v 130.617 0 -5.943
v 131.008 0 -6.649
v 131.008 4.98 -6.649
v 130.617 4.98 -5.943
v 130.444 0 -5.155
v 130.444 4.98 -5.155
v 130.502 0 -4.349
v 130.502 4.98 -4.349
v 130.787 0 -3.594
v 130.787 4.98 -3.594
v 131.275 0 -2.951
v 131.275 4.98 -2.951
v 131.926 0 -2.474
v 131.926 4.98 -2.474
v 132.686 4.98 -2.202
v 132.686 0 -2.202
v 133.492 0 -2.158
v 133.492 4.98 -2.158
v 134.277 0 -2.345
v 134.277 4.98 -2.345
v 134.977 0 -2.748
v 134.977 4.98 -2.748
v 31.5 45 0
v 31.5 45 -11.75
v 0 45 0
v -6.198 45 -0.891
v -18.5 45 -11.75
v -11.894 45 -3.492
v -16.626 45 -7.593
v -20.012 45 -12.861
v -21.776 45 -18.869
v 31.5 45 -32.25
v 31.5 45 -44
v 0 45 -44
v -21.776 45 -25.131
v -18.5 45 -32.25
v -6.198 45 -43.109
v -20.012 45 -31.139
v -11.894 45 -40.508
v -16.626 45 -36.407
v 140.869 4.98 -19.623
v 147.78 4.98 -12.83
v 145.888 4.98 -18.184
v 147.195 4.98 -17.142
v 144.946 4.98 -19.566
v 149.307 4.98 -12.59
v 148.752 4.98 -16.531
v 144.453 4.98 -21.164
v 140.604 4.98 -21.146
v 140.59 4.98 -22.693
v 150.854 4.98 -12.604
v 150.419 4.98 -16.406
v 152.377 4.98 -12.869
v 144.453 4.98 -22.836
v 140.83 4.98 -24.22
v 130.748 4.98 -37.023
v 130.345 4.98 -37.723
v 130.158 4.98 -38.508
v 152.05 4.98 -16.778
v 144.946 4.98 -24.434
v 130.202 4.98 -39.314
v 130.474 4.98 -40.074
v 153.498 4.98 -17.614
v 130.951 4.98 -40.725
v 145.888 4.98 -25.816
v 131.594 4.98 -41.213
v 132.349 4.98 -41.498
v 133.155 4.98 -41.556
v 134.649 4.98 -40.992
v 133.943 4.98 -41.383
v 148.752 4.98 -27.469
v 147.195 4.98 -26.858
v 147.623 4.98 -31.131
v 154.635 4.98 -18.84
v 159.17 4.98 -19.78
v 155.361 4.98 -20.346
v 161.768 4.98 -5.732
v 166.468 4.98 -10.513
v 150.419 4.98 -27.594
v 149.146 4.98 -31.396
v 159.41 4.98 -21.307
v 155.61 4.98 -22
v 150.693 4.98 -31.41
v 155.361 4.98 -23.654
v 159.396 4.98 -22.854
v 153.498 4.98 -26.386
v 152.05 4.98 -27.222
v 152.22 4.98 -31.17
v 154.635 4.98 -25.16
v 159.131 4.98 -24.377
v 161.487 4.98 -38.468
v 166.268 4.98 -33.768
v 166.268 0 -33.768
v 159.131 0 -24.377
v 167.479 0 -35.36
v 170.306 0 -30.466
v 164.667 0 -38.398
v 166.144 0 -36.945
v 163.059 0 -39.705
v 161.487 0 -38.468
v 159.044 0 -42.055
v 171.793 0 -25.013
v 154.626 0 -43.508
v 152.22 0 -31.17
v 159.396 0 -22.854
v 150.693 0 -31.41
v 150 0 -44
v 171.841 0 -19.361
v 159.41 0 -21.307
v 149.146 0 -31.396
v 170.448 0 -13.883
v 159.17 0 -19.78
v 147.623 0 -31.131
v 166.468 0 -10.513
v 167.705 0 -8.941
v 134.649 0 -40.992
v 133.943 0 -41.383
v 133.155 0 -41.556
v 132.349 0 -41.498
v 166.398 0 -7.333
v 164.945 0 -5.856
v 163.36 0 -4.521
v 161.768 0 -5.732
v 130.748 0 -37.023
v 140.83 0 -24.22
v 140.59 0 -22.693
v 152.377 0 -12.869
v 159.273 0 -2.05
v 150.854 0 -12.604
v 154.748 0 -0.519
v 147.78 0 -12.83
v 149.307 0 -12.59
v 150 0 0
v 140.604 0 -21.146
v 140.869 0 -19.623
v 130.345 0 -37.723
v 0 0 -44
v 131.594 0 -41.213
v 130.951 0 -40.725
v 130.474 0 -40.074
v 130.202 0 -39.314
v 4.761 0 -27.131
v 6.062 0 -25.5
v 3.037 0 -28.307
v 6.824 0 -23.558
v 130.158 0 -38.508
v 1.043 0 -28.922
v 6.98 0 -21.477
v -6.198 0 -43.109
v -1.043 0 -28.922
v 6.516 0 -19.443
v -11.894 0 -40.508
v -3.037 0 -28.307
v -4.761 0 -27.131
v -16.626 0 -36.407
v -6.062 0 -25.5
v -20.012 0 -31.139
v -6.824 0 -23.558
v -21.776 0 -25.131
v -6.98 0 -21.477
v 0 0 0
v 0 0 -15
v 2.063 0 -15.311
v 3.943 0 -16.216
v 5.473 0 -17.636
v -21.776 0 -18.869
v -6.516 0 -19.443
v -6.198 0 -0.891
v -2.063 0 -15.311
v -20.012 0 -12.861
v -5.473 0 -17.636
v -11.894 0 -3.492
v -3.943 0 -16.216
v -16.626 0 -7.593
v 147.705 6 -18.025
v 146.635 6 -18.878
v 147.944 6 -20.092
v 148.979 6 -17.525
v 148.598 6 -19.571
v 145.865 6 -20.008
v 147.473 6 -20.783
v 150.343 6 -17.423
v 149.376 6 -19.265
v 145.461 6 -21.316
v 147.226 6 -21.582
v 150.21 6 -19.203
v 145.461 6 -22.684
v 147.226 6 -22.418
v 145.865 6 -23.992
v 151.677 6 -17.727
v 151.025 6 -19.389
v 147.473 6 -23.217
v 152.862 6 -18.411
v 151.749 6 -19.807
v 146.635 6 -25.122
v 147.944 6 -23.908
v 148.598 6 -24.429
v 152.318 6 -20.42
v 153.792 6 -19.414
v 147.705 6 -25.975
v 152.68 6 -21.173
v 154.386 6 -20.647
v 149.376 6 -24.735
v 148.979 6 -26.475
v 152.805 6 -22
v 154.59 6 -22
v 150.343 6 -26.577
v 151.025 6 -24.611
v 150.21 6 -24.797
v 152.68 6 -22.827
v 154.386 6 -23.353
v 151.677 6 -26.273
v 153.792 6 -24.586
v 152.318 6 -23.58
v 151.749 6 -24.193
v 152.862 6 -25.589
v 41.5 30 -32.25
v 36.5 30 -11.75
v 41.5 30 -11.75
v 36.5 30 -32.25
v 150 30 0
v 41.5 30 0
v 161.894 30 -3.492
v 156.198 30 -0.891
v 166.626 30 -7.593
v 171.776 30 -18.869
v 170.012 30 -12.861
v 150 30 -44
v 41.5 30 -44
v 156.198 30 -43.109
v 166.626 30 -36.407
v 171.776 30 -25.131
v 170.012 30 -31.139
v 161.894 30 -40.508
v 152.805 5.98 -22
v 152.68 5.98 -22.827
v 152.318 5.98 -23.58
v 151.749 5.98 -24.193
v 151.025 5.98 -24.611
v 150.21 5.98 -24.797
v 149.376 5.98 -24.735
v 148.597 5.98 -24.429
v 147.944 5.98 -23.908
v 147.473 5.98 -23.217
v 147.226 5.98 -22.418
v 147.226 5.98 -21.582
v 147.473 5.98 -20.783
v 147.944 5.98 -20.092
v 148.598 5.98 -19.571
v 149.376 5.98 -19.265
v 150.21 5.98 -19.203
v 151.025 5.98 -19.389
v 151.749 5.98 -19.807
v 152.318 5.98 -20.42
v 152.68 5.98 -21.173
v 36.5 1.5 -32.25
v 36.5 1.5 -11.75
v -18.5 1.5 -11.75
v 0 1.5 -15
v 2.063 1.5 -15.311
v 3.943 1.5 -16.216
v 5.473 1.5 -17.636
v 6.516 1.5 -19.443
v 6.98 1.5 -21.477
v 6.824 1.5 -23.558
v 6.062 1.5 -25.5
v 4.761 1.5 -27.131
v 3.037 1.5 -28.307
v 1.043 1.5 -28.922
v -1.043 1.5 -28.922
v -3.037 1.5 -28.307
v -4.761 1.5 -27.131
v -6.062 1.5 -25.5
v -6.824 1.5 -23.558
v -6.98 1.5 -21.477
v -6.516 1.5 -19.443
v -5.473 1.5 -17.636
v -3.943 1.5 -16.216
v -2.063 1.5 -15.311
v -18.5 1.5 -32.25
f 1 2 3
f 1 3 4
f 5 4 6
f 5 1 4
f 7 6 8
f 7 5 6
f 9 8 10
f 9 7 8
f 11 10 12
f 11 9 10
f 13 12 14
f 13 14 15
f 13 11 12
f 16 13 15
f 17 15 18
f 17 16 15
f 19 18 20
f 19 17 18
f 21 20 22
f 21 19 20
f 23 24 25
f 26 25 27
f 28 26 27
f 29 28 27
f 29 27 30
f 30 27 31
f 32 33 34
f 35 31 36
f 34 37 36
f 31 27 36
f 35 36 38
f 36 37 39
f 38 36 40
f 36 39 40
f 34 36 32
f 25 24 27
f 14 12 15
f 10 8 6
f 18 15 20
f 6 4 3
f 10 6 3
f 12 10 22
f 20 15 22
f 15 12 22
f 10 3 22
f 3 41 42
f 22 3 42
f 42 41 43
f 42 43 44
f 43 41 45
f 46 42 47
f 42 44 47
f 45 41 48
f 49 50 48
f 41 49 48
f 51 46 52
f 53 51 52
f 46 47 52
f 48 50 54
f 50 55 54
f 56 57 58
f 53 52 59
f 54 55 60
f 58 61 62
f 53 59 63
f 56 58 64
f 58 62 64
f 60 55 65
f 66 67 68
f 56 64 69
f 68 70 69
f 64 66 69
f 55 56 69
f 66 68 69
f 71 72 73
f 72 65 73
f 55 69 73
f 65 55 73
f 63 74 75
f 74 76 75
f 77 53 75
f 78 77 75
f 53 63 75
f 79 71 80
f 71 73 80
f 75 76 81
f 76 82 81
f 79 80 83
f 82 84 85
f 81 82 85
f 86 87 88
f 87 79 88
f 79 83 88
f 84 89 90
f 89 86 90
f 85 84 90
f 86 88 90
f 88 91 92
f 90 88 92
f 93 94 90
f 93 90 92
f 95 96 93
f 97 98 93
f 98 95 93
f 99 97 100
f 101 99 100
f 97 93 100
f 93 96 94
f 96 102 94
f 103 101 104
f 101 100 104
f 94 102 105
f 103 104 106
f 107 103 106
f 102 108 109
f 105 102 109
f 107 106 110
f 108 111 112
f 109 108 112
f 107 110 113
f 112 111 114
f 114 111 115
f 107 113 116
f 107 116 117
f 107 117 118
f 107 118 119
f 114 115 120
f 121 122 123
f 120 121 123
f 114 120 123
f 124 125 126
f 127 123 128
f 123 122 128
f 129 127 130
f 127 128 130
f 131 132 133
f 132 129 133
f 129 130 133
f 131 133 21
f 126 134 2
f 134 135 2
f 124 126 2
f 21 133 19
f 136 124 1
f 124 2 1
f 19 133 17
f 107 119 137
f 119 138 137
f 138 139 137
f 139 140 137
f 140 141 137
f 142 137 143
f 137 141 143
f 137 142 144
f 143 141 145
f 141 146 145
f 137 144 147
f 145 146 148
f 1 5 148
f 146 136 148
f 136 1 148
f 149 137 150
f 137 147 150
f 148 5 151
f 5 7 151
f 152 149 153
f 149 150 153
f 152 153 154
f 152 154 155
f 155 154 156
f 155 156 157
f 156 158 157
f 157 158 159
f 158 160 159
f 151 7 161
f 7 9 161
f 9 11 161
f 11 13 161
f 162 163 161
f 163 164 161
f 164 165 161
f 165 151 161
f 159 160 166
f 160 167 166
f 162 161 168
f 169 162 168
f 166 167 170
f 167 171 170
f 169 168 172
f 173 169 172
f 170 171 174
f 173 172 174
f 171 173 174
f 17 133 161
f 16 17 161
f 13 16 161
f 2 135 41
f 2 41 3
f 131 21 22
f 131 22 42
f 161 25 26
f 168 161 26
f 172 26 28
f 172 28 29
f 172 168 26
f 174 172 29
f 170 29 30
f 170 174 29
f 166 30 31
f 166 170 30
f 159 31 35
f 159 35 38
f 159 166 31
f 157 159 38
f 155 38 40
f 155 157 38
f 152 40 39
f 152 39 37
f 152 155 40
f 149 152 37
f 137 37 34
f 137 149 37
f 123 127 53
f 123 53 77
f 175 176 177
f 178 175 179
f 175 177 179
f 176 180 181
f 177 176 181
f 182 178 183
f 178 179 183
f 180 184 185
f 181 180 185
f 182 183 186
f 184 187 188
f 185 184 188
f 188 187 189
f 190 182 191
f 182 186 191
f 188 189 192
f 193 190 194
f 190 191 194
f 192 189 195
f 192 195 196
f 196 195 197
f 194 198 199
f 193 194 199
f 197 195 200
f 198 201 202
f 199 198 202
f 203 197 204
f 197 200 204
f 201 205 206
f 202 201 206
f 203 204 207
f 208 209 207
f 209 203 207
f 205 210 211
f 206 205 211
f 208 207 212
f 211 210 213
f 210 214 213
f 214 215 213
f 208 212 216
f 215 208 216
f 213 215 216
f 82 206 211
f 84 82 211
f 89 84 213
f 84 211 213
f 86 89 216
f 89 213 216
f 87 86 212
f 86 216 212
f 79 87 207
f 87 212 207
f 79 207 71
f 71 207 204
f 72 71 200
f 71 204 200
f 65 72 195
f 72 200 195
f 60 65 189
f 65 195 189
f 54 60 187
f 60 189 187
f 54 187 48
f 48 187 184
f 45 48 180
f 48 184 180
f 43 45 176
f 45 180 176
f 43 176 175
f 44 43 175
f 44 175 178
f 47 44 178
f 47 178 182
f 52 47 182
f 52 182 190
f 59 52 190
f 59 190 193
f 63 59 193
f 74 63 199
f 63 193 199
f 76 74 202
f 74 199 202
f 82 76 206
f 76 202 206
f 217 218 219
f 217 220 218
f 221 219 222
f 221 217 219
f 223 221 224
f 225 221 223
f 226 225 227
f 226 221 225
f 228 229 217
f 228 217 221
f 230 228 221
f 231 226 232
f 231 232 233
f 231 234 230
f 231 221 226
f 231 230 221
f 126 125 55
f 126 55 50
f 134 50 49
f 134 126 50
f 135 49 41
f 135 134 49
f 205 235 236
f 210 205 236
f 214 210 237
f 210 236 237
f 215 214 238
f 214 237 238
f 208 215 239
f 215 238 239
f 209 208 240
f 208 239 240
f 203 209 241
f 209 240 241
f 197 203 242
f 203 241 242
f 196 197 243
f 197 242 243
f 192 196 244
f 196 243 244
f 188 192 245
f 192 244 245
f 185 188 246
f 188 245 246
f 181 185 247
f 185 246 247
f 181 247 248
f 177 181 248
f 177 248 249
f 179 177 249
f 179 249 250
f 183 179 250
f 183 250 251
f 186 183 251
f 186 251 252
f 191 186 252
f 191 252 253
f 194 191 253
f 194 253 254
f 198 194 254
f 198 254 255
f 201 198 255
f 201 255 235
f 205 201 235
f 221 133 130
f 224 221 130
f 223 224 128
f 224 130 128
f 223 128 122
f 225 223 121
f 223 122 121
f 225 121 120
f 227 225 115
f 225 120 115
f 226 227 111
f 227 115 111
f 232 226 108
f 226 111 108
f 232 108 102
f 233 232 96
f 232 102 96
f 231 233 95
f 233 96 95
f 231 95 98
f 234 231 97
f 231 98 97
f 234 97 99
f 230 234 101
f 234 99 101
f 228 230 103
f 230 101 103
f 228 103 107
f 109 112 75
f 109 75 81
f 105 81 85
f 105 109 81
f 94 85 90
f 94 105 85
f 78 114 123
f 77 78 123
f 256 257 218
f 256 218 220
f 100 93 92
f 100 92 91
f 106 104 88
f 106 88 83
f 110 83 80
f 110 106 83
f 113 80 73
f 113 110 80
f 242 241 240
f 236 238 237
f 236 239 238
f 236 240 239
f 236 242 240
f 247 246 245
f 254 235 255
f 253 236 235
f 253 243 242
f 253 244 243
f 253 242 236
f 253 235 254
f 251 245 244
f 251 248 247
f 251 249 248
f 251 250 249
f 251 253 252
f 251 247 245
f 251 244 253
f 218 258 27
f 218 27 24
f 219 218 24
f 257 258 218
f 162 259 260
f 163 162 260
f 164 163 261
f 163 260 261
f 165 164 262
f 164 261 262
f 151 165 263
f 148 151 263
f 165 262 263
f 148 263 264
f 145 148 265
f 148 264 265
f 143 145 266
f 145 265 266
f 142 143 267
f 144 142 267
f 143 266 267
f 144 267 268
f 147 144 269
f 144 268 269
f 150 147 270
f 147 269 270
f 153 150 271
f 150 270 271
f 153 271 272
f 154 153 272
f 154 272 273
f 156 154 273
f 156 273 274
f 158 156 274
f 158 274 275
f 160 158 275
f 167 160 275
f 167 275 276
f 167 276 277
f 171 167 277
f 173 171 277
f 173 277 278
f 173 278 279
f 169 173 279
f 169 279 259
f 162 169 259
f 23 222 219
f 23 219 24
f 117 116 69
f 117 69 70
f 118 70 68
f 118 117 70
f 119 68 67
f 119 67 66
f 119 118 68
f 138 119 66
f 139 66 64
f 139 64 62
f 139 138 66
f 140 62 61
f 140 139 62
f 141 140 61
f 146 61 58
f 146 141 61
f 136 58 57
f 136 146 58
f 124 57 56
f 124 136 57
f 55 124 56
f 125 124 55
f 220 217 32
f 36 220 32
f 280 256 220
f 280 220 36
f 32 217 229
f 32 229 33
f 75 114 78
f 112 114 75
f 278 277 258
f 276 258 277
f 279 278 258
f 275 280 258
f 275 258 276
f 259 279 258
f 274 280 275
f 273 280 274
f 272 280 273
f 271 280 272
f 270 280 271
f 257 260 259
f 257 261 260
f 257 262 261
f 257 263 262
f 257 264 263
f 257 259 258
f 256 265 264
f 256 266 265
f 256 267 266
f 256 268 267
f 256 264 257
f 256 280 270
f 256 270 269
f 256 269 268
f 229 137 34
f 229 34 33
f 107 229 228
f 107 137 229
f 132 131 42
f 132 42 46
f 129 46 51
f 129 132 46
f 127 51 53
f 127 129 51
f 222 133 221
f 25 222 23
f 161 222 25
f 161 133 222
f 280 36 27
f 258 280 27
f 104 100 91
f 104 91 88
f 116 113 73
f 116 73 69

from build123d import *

# Parameters (mm, degrees)
BOSS_EXTRUDE1_DEPTH = 30
SKETCH2_R           = 7
CUT_EXTRUDE1_DEPTH  = 181.055546985
CUT_EXTRUDE2_DEPTH  = 28.5
BOSS_EXTRUDE2_DEPTH = 15
CUT_EXTRUDE3_DEPTH  = 184.152941554
CAVITY1_OUTLINE_R   = 1.02
CAVITY1_DEPTH       = 4.98
CAVITY1_START       = 2.94
CAVITY1_2_OUTLINE_R = 1.683
CAVITY1_2_DEPTH     = 2.04
CAVITY1_START_2     = 4.98
CAVITY1_3_OUTLINE_R = 2.805
CAVITY1_3_DEPTH     = 1.02
SKETCH7_R           = 1.02
SKETCH7_R_2         = 5.61
CUT_EXTRUDE4_DEPTH  = 4.98
SKETCH8_R           = 2.805
CUT_EXTRUDE5_DEPTH  = 1
BOSS_EXTRUDE3_START = 4.98
BOSS_EXTRUDE3_DEPTH = 4.98


with BuildPart() as part:
    # Sketch1 → Boss-Extrude1 (new body)
    with BuildSketch(Plane(origin=(0, 0, 0), x_dir=(1, 0, 0), z_dir=(0, 1, 0))):
        with BuildLine():
            Line((0, 0), (150, 0))
            ThreePointArc((150, 0), (172, 22), (150, 44))
            Line((150, 44), (0, 44))
            ThreePointArc((0, 44), (-22, 22), (0, 0))
        make_face()
    extrude(amount=BOSS_EXTRUDE1_DEPTH)

    # Sketch2 → Cut-Extrude1 (cut, through all)
    with BuildSketch(Plane(origin=(0, 30, 0), x_dir=(1, 0, 0), z_dir=(0, 1, 0))):
        with Locations(Location((0, 22, 0), (0, 0, 270))):
            Circle(SKETCH2_R)
    extrude(amount=-CUT_EXTRUDE1_DEPTH, mode=Mode.SUBTRACT)

    # Sketch3 → Cut-Extrude2 (cut)
    with BuildSketch(Plane(origin=(0, 30, 0), x_dir=(1, 0, 0), z_dir=(0, 1, 0))):
        Polygon((0, 32.25), (-18.5, 32.25), (-18.5, 11.75), (0, 11.75), (36.5, 11.75), (36.5, 32.25), align=None)
    extrude(amount=-CUT_EXTRUDE2_DEPTH, mode=Mode.SUBTRACT)

    # Sketch5 → Boss-Extrude2 (add)
    with BuildSketch(Plane(origin=(0, 30, 0), x_dir=(1, 0, 0), z_dir=(0, 1, 0))):
        with BuildLine():
            Line((-18.5, 32.25), (-18.5, 11.75))
            Line((-18.5, 11.75), (41.5, 11.75))
            Line((41.5, 11.75), (41.5, 0))
            Line((41.5, 0), (0, 0))
            ThreePointArc((0, 0), (-22, 22), (0, 44))
            Line((0, 44), (41.5, 44))
            Line((41.5, 44), (41.5, 32.25))
            Line((41.5, 32.25), (-18.5, 32.25))
        make_face()
    extrude(amount=BOSS_EXTRUDE2_DEPTH)

    # Sketch6 → Cut-Extrude3 (cut, through all)
    with BuildSketch(Plane.XY):
        Polygon((31.5, 45), (41.5, 45), (41.5, 30), align=None)
    extrude(amount=-CUT_EXTRUDE3_DEPTH, mode=Mode.SUBTRACT)

    # Cavity1: read off the stored shape, not the designer's step
    # Cavity1 outline → Cavity1 (cut)
    with BuildSketch(Plane(origin=(0, 0, 0), x_dir=(1, 0, 0), z_dir=(0, 1, 0))):
        with BuildLine():
            ThreePointArc((147.779668933, 12.829975193), (150.080823725, 12.565346189), (152.377107132, 12.869360007))
            Line((152.377107132, 12.869360007), (163.360195023, 4.52129327))
            ThreePointArc((163.360195023, 4.52129327), (165.689039875, 6.577483091), (167.705029876, 8.941213032))
            Line((167.705029876, 8.941213032), (159.170024807, 19.779668933))
            ThreePointArc((159.170024807, 19.779668933), (159.434653811, 22.080823725), (159.130639993, 24.377107132))
            Line((159.130639993, 24.377107132), (167.47870673, 35.360195023))
            ThreePointArc((167.47870673, 35.360195023), (165.422516909, 37.689039875), (163.058786968, 39.705029876))
            Line((163.058786968, 39.705029876), (152.220331067, 31.170024807))
            ThreePointArc((152.220331067, 31.170024807), (149.919176275, 31.434653811), (147.622892868, 31.130639993))
            Line((147.622892868, 31.130639993), (134.649096594, 40.991811842))
            ThreePointArc((134.649096594, 40.991811842), (130.951366883, 40.725037906), (130.747982035, 37.023280491))
            Line((130.747982035, 37.023280491), (140.829975193, 24.220331067))
            ThreePointArc((140.829975193, 24.220331067), (140.565346189, 21.919176275), (140.869360007, 19.622892868))
            Line((140.869360007, 19.622892868), (131.008188158, 6.649096594))
            ThreePointArc((131.008188158, 6.649096594), (131.274962094, 2.951366883), (134.976719509, 2.747982035))
            Line((134.976719509, 2.747982035), (147.779668933, 12.829975193))
        make_face()
        with Locations((133.375227796, 5.087928153)):
            Circle(CAVITY1_OUTLINE_R, mode=Mode.SUBTRACT)
        with Locations((136.950447624, 8.724932851)):
            Circle(CAVITY1_OUTLINE_R, mode=Mode.SUBTRACT)
        with Locations((140.525667453, 12.36193755)):
            Circle(CAVITY1_OUTLINE_R, mode=Mode.SUBTRACT)
        with Locations((144.100887282, 15.998942248)):
            Circle(CAVITY1_OUTLINE_R, mode=Mode.SUBTRACT)
        with Locations((163.275067149, 8.950447624)):
            Circle(CAVITY1_OUTLINE_R, mode=Mode.SUBTRACT)
        with Locations((156.001057752, 16.100887282)):
            Circle(CAVITY1_OUTLINE_R, mode=Mode.SUBTRACT)
        with Locations((159.63806245, 12.525667453)):
            Circle(CAVITY1_OUTLINE_R, mode=Mode.SUBTRACT)
        with Locations((140.36193755, 31.474332547)):
            Circle(CAVITY1_OUTLINE_R, mode=Mode.SUBTRACT)
        with BuildLine():
            Line((152.373607277, 19.467574131), (152.689172923, 18.931653704))
            ThreePointArc((152.689172923, 18.931653704), (152.511383831, 18.784513838), (152.325559725, 18.647661717))
            Line((152.325559725, 18.647661717), (151.882040304, 19.083646698))
            Line((151.882040304, 19.083646698), (151.637288525, 18.939529681))
            Line((151.637288525, 18.939529681), (151.80339512, 18.340195901))
            ThreePointArc((151.80339512, 18.340195901), (151.593581444, 18.244084908), (151.378669205, 18.159990726))
            Line((151.378669205, 18.159990726), (151.063103559, 18.695911153))
            Line((151.063103559, 18.695911153), (150.789391266, 18.620051226))
            Line((150.789391266, 18.620051226), (150.794718919, 17.998147699))
            ThreePointArc((150.794718919, 17.998147699), (150.567179115, 17.959615383), (150.337824658, 17.934010022))
            Line((150.337824658, 17.934010022), (150.171718063, 18.533343802))
            Line((150.171718063, 18.533343802), (149.887698297, 18.530910694))
            Line((149.887698297, 18.530910694), (149.731883937, 17.928819118))
            ThreePointArc((149.731883937, 17.928819118), (149.502124467, 17.950491394), (149.273957918, 17.985119816))
            Line((149.273957918, 17.985119816), (149.268630266, 18.607023342))
            Line((149.268630266, 18.607023342), (148.993658503, 18.678182865))
            Line((148.993658503, 18.678182865), (148.687320622, 18.136934786))
            ThreePointArc((148.687320622, 18.136934786), (148.470999214, 18.217334723), (148.259569747, 18.309837059))
            Line((148.259569747, 18.309837059), (148.415384106, 18.911928635))
            Line((148.415384106, 18.911928635), (148.168199219, 19.051831385))
            Line((148.168199219, 19.051831385), (147.732214237, 18.608311964))
            ThreePointArc((147.732214237, 18.608311964), (147.544072837, 18.74196044), (147.363789021, 18.886032808))
            Line((147.363789021, 18.886032808), (147.670126902, 19.427280887))
            Line((147.670126902, 19.427280887), (147.467574131, 19.626392723))
            Line((147.467574131, 19.626392723), (146.931653704, 19.310827077))
            ThreePointArc((146.931653704, 19.310827077), (146.784513838, 19.488616169), (146.647661717, 19.674440275))
            Line((146.647661717, 19.674440275), (147.083646698, 20.117959696))
            Line((147.083646698, 20.117959696), (146.939529681, 20.362711475))
            Line((146.939529681, 20.362711475), (146.340195901, 20.19660488))
            ThreePointArc((146.340195901, 20.19660488), (146.244084908, 20.406418556), (146.159990726, 20.621330795))
            Line((146.159990726, 20.621330795), (146.695911153, 20.936896441))
            Line((146.695911153, 20.936896441), (146.620051226, 21.210608734))
            Line((146.620051226, 21.210608734), (145.998147699, 21.205281081))
            ThreePointArc((145.998147699, 21.205281081), (145.959615383, 21.432820885), (145.934010022, 21.662175342))
            Line((145.934010022, 21.662175342), (146.533343802, 21.828281937))
            Line((146.533343802, 21.828281937), (146.530910694, 22.112301703))
            Line((146.530910694, 22.112301703), (145.928819118, 22.268116063))
            ThreePointArc((145.928819118, 22.268116063), (145.950491394, 22.497875533), (145.985119816, 22.726042082))
            Line((145.985119816, 22.726042082), (146.607023342, 22.731369734))
            Line((146.607023342, 22.731369734), (146.678182865, 23.006341497))
            Line((146.678182865, 23.006341497), (146.136934786, 23.312679378))
            ThreePointArc((146.136934786, 23.312679378), (146.217334723, 23.529000786), (146.309837059, 23.740430253))
            Line((146.309837059, 23.740430253), (146.911928635, 23.584615894))
            Line((146.911928635, 23.584615894), (147.051831385, 23.831800781))
            Line((147.051831385, 23.831800781), (146.608311964, 24.267785763))
            ThreePointArc((146.608311964, 24.267785763), (146.74196044, 24.455927163), (146.886032808, 24.636210979))
            Line((146.886032808, 24.636210979), (147.427280887, 24.329873098))
            Line((147.427280887, 24.329873098), (147.626392723, 24.532425869))
            Line((147.626392723, 24.532425869), (147.310827077, 25.068346296))
            ThreePointArc((147.310827077, 25.068346296), (147.488616169, 25.215486162), (147.674440275, 25.352338283))
            Line((147.674440275, 25.352338283), (148.117959696, 24.916353302))
            Line((148.117959696, 24.916353302), (148.362711475, 25.060470319))
            Line((148.362711475, 25.060470319), (148.19660488, 25.659804099))
            ThreePointArc((148.19660488, 25.659804099), (148.406418556, 25.755915092), (148.621330795, 25.840009274))
            Line((148.621330795, 25.840009274), (148.936896441, 25.304088847))
            Line((148.936896441, 25.304088847), (149.210608734, 25.379948774))
            Line((149.210608734, 25.379948774), (149.205281081, 26.001852301))
            ThreePointArc((149.205281081, 26.001852301), (149.432820885, 26.040384617), (149.662175342, 26.065989978))
            Line((149.662175342, 26.065989978), (149.828281937, 25.466656198))
            Line((149.828281937, 25.466656198), (150.112301703, 25.469089306))
            Line((150.112301703, 25.469089306), (150.268116063, 26.071180882))
            ThreePointArc((150.268116063, 26.071180882), (150.497875533, 26.049508606), (150.726042082, 26.014880184))
            Line((150.726042082, 26.014880184), (150.731369734, 25.392976658))
            Line((150.731369734, 25.392976658), (151.006341497, 25.321817135))
            Line((151.006341497, 25.321817135), (151.312679378, 25.863065214))
            ThreePointArc((151.312679378, 25.863065214), (151.529000786, 25.782665277), (151.740430253, 25.690162941))
            Line((151.740430253, 25.690162941), (151.584615894, 25.088071365))
            Line((151.584615894, 25.088071365), (151.831800781, 24.948168615))
            Line((151.831800781, 24.948168615), (152.267785763, 25.391688036))
            ThreePointArc((152.267785763, 25.391688036), (152.455927163, 25.25803956), (152.636210979, 25.113967192))
            Line((152.636210979, 25.113967192), (152.329873098, 24.572719113))
            Line((152.329873098, 24.572719113), (152.532425869, 24.373607277))
            Line((152.532425869, 24.373607277), (153.068346296, 24.689172923))
            ThreePointArc((153.068346296, 24.689172923), (153.215486162, 24.511383831), (153.352338283, 24.325559725))
            Line((153.352338283, 24.325559725), (152.916353302, 23.882040304))
            Line((152.916353302, 23.882040304), (153.060470319, 23.637288525))
            Line((153.060470319, 23.637288525), (153.659804099, 23.80339512))
            ThreePointArc((153.659804099, 23.80339512), (153.755915092, 23.593581444), (153.840009274, 23.378669205))
            Line((153.840009274, 23.378669205), (153.304088847, 23.063103559))
            Line((153.304088847, 23.063103559), (153.379948774, 22.789391266))
            Line((153.379948774, 22.789391266), (154.001852301, 22.794718919))
            ThreePointArc((154.001852301, 22.794718919), (154.040384617, 22.567179115), (154.065989978, 22.337824658))
            Line((154.065989978, 22.337824658), (153.466656198, 22.171718063))
            Line((153.466656198, 22.171718063), (153.469089306, 21.887698297))
            Line((153.469089306, 21.887698297), (154.071180882, 21.731883937))
            ThreePointArc((154.071180882, 21.731883937), (154.049508606, 21.502124467), (154.014880184, 21.273957918))
            Line((154.014880184, 21.273957918), (153.392976658, 21.268630266))
            Line((153.392976658, 21.268630266), (153.321817135, 20.993658503))
            Line((153.321817135, 20.993658503), (153.863065214, 20.687320622))
            ThreePointArc((153.863065214, 20.687320622), (153.782665277, 20.470999214), (153.690162941, 20.259569747))
            Line((153.690162941, 20.259569747), (153.088071365, 20.415384106))
            Line((153.088071365, 20.415384106), (152.948168615, 20.168199219))
            Line((152.948168615, 20.168199219), (153.391688036, 19.732214237))
            ThreePointArc((153.391688036, 19.732214237), (153.25803956, 19.544072837), (153.113967192, 19.363789021))
            Line((153.113967192, 19.363789021), (152.572719113, 19.670126902))
            Line((152.572719113, 19.670126902), (152.373607277, 19.467574131))
        make_face(mode=Mode.SUBTRACT)
        with Locations((143.998942248, 27.899112718)):
            Circle(CAVITY1_OUTLINE_R, mode=Mode.SUBTRACT)
        with Locations((136.724932851, 35.049552376)):
            Circle(CAVITY1_OUTLINE_R, mode=Mode.SUBTRACT)
        with Locations((133.087928153, 38.624772204)):
            Circle(CAVITY1_OUTLINE_R, mode=Mode.SUBTRACT)
        with Locations((155.899112718, 28.001057752)):
            Circle(CAVITY1_OUTLINE_R, mode=Mode.SUBTRACT)
        with Locations((159.474332547, 31.63806245)):
            Circle(CAVITY1_OUTLINE_R, mode=Mode.SUBTRACT)
        with Locations((163.049552376, 35.275067149)):
            Circle(CAVITY1_OUTLINE_R, mode=Mode.SUBTRACT)
    extrude(amount=CAVITY1_DEPTH, mode=Mode.SUBTRACT)

    # Cavity1 2 outline → Cavity1 2 (cut)
    with BuildSketch(Plane(origin=(0, 0, 0), x_dir=(1, 0, 0), z_dir=(0, 1, 0)).offset(CAVITY1_START)):
        with BuildLine():
            ThreePointArc((152.325559725, 18.647661717), (152.511383831, 18.784513838), (152.689172923, 18.931653704))
            Line((152.689172923, 18.931653704), (152.373607277, 19.467574131))
            Line((152.373607277, 19.467574131), (152.572719113, 19.670126902))
            Line((152.572719113, 19.670126902), (153.113967192, 19.363789021))
            ThreePointArc((153.113967192, 19.363789021), (153.25803956, 19.544072837), (153.391688036, 19.732214237))
            Line((153.391688036, 19.732214237), (152.948168615, 20.168199219))
            Line((152.948168615, 20.168199219), (153.088071365, 20.415384106))
            Line((153.088071365, 20.415384106), (153.690162941, 20.259569747))
            ThreePointArc((153.690162941, 20.259569747), (153.782665277, 20.470999214), (153.863065214, 20.687320622))
            Line((153.863065214, 20.687320622), (153.321817135, 20.993658503))
            Line((153.321817135, 20.993658503), (153.392976658, 21.268630266))
            Line((153.392976658, 21.268630266), (154.014880184, 21.273957918))
            ThreePointArc((154.014880184, 21.273957918), (154.049508606, 21.502124467), (154.071180882, 21.731883937))
            Line((154.071180882, 21.731883937), (153.469089306, 21.887698297))
            Line((153.469089306, 21.887698297), (153.466656198, 22.171718063))
            Line((153.466656198, 22.171718063), (154.065989978, 22.337824658))
            ThreePointArc((154.065989978, 22.337824658), (154.040384617, 22.567179115), (154.001852301, 22.794718919))
            Line((154.001852301, 22.794718919), (153.379948774, 22.789391266))
            Line((153.379948774, 22.789391266), (153.304088847, 23.063103559))
            Line((153.304088847, 23.063103559), (153.840009274, 23.378669205))
            ThreePointArc((153.840009274, 23.378669205), (153.755915092, 23.593581444), (153.659804099, 23.80339512))
            Line((153.659804099, 23.80339512), (153.060470319, 23.637288525))
            Line((153.060470319, 23.637288525), (152.916353302, 23.882040304))
            Line((152.916353302, 23.882040304), (153.352338283, 24.325559725))
            ThreePointArc((153.352338283, 24.325559725), (153.215486162, 24.511383831), (153.068346296, 24.689172923))
            Line((153.068346296, 24.689172923), (152.532425869, 24.373607277))
            Line((152.532425869, 24.373607277), (152.329873098, 24.572719113))
            Line((152.329873098, 24.572719113), (152.636210979, 25.113967192))
            ThreePointArc((152.636210979, 25.113967192), (152.455927163, 25.25803956), (152.267785763, 25.391688036))
            Line((152.267785763, 25.391688036), (151.831800781, 24.948168615))
            Line((151.831800781, 24.948168615), (151.584615894, 25.088071365))
            Line((151.584615894, 25.088071365), (151.740430253, 25.690162941))
            ThreePointArc((151.740430253, 25.690162941), (151.529000786, 25.782665277), (151.312679378, 25.863065214))
            Line((151.312679378, 25.863065214), (151.006341497, 25.321817135))
            Line((151.006341497, 25.321817135), (150.731369734, 25.392976658))
            Line((150.731369734, 25.392976658), (150.726042082, 26.014880184))
            ThreePointArc((150.726042082, 26.014880184), (150.497875533, 26.049508606), (150.268116063, 26.071180882))
            Line((150.268116063, 26.071180882), (150.112301703, 25.469089306))
            Line((150.112301703, 25.469089306), (149.828281937, 25.466656198))
            Line((149.828281937, 25.466656198), (149.662175342, 26.065989978))
            ThreePointArc((149.662175342, 26.065989978), (149.432820885, 26.040384617), (149.205281081, 26.001852301))
            Line((149.205281081, 26.001852301), (149.210608734, 25.379948774))
            Line((149.210608734, 25.379948774), (148.936896441, 25.304088847))
            Line((148.936896441, 25.304088847), (148.621330795, 25.840009274))
            ThreePointArc((148.621330795, 25.840009274), (148.406418556, 25.755915092), (148.19660488, 25.659804099))
            Line((148.19660488, 25.659804099), (148.362711475, 25.060470319))
            Line((148.362711475, 25.060470319), (148.117959696, 24.916353302))
            Line((148.117959696, 24.916353302), (147.674440275, 25.352338283))
            ThreePointArc((147.674440275, 25.352338283), (147.488616169, 25.215486162), (147.310827077, 25.068346296))
            Line((147.310827077, 25.068346296), (147.626392723, 24.532425869))
            Line((147.626392723, 24.532425869), (147.427280887, 24.329873098))
            Line((147.427280887, 24.329873098), (146.886032808, 24.636210979))
            ThreePointArc((146.886032808, 24.636210979), (146.74196044, 24.455927163), (146.608311964, 24.267785763))
            Line((146.608311964, 24.267785763), (147.051831385, 23.831800781))
            Line((147.051831385, 23.831800781), (146.911928635, 23.584615894))
            Line((146.911928635, 23.584615894), (146.309837059, 23.740430253))
            ThreePointArc((146.309837059, 23.740430253), (146.217334723, 23.529000786), (146.136934786, 23.312679378))
            Line((146.136934786, 23.312679378), (146.678182865, 23.006341497))
            Line((146.678182865, 23.006341497), (146.607023342, 22.731369734))
            Line((146.607023342, 22.731369734), (145.985119816, 22.726042082))
            ThreePointArc((145.985119816, 22.726042082), (145.950491394, 22.497875533), (145.928819118, 22.268116063))
            Line((145.928819118, 22.268116063), (146.530910694, 22.112301703))
            Line((146.530910694, 22.112301703), (146.533343802, 21.828281937))
            Line((146.533343802, 21.828281937), (145.934010022, 21.662175342))
            ThreePointArc((145.934010022, 21.662175342), (145.959615383, 21.432820885), (145.998147699, 21.205281081))
            Line((145.998147699, 21.205281081), (146.620051226, 21.210608734))
            Line((146.620051226, 21.210608734), (146.695911153, 20.936896441))
            Line((146.695911153, 20.936896441), (146.159990726, 20.621330795))
            ThreePointArc((146.159990726, 20.621330795), (146.244084908, 20.406418556), (146.340195901, 20.19660488))
            Line((146.340195901, 20.19660488), (146.939529681, 20.362711475))
            Line((146.939529681, 20.362711475), (147.083646698, 20.117959696))
            Line((147.083646698, 20.117959696), (146.647661717, 19.674440275))
            ThreePointArc((146.647661717, 19.674440275), (146.784513838, 19.488616169), (146.931653704, 19.310827077))
            Line((146.931653704, 19.310827077), (147.467574131, 19.626392723))
            Line((147.467574131, 19.626392723), (147.670126902, 19.427280887))
            Line((147.670126902, 19.427280887), (147.363789021, 18.886032808))
            ThreePointArc((147.363789021, 18.886032808), (147.544072837, 18.74196044), (147.732214237, 18.608311964))
            Line((147.732214237, 18.608311964), (148.168199219, 19.051831385))
            Line((148.168199219, 19.051831385), (148.415384106, 18.911928635))
            Line((148.415384106, 18.911928635), (148.259569747, 18.309837059))
            ThreePointArc((148.259569747, 18.309837059), (148.470999214, 18.217334723), (148.687320622, 18.136934786))
            Line((148.687320622, 18.136934786), (148.993658503, 18.678182865))
            Line((148.993658503, 18.678182865), (149.268630266, 18.607023342))
            Line((149.268630266, 18.607023342), (149.273957918, 17.985119816))
            ThreePointArc((149.273957918, 17.985119816), (149.502124467, 17.950491394), (149.731883937, 17.928819118))
            Line((149.731883937, 17.928819118), (149.887698297, 18.530910694))
            Line((149.887698297, 18.530910694), (150.171718063, 18.533343802))
            Line((150.171718063, 18.533343802), (150.337824658, 17.934010022))
            ThreePointArc((150.337824658, 17.934010022), (150.567179115, 17.959615383), (150.794718919, 17.998147699))
            Line((150.794718919, 17.998147699), (150.789391266, 18.620051226))
            Line((150.789391266, 18.620051226), (151.063103559, 18.695911153))
            Line((151.063103559, 18.695911153), (151.378669205, 18.159990726))
            ThreePointArc((151.378669205, 18.159990726), (151.593581444, 18.244084908), (151.80339512, 18.340195901))
            Line((151.80339512, 18.340195901), (151.637288525, 18.939529681))
            Line((151.637288525, 18.939529681), (151.882040304, 19.083646698))
            Line((151.882040304, 19.083646698), (152.325559725, 18.647661717))
        make_face()
        with Locations((150, 22)):
            Circle(CAVITY1_2_OUTLINE_R, mode=Mode.SUBTRACT)
    extrude(amount=CAVITY1_2_DEPTH, mode=Mode.SUBTRACT)

    # Cavity1 3 outline → Cavity1 3 (cut)
    with BuildSketch(Plane(origin=(0, 0, 0), x_dir=(1, 0, 0), z_dir=(0, 1, 0)).offset(CAVITY1_START_2)):
        with BuildLine():
            ThreePointArc((152.325559725, 18.647661717), (152.511383831, 18.784513838), (152.689172923, 18.931653704))
            Line((152.689172923, 18.931653704), (152.373607277, 19.467574131))
            Line((152.373607277, 19.467574131), (152.572719113, 19.670126902))
            Line((152.572719113, 19.670126902), (153.113967192, 19.363789021))
            ThreePointArc((153.113967192, 19.363789021), (153.25803956, 19.544072837), (153.391688036, 19.732214237))
            Line((153.391688036, 19.732214237), (152.948168615, 20.168199219))
            Line((152.948168615, 20.168199219), (153.088071365, 20.415384106))
            Line((153.088071365, 20.415384106), (153.690162941, 20.259569747))
            ThreePointArc((153.690162941, 20.259569747), (153.782665277, 20.470999214), (153.863065214, 20.687320622))
            Line((153.863065214, 20.687320622), (153.321817135, 20.993658503))
            Line((153.321817135, 20.993658503), (153.392976658, 21.268630266))
            Line((153.392976658, 21.268630266), (154.014880184, 21.273957918))
            ThreePointArc((154.014880184, 21.273957918), (154.049508606, 21.502124467), (154.071180882, 21.731883937))
            Line((154.071180882, 21.731883937), (153.469089306, 21.887698297))
            Line((153.469089306, 21.887698297), (153.466656198, 22.171718063))
            Line((153.466656198, 22.171718063), (154.065989978, 22.337824658))
            ThreePointArc((154.065989978, 22.337824658), (154.040384617, 22.567179115), (154.001852301, 22.794718919))
            Line((154.001852301, 22.794718919), (153.379948774, 22.789391266))
            Line((153.379948774, 22.789391266), (153.304088847, 23.063103559))
            Line((153.304088847, 23.063103559), (153.840009274, 23.378669205))
            ThreePointArc((153.840009274, 23.378669205), (153.755915092, 23.593581444), (153.659804099, 23.80339512))
            Line((153.659804099, 23.80339512), (153.060470319, 23.637288525))
            Line((153.060470319, 23.637288525), (152.916353302, 23.882040304))
            Line((152.916353302, 23.882040304), (153.352338283, 24.325559725))
            ThreePointArc((153.352338283, 24.325559725), (153.215486162, 24.511383831), (153.068346296, 24.689172923))
            Line((153.068346296, 24.689172923), (152.532425869, 24.373607277))
            Line((152.532425869, 24.373607277), (152.329873098, 24.572719113))
            Line((152.329873098, 24.572719113), (152.636210979, 25.113967192))
            ThreePointArc((152.636210979, 25.113967192), (152.455927163, 25.25803956), (152.267785763, 25.391688036))
            Line((152.267785763, 25.391688036), (151.831800781, 24.948168615))
            Line((151.831800781, 24.948168615), (151.584615894, 25.088071365))
            Line((151.584615894, 25.088071365), (151.740430253, 25.690162941))
            ThreePointArc((151.740430253, 25.690162941), (151.529000786, 25.782665277), (151.312679378, 25.863065214))
            Line((151.312679378, 25.863065214), (151.006341497, 25.321817135))
            Line((151.006341497, 25.321817135), (150.731369734, 25.392976658))
            Line((150.731369734, 25.392976658), (150.726042082, 26.014880184))
            ThreePointArc((150.726042082, 26.014880184), (150.497875533, 26.049508606), (150.268116063, 26.071180882))
            Line((150.268116063, 26.071180882), (150.112301703, 25.469089306))
            Line((150.112301703, 25.469089306), (149.828281937, 25.466656198))
            Line((149.828281937, 25.466656198), (149.662175342, 26.065989978))
            ThreePointArc((149.662175342, 26.065989978), (149.432820885, 26.040384617), (149.205281081, 26.001852301))
            Line((149.205281081, 26.001852301), (149.210608734, 25.379948774))
            Line((149.210608734, 25.379948774), (148.936896441, 25.304088847))
            Line((148.936896441, 25.304088847), (148.621330795, 25.840009274))
            ThreePointArc((148.621330795, 25.840009274), (148.406418556, 25.755915092), (148.19660488, 25.659804099))
            Line((148.19660488, 25.659804099), (148.362711475, 25.060470319))
            Line((148.362711475, 25.060470319), (148.117959696, 24.916353302))
            Line((148.117959696, 24.916353302), (147.674440275, 25.352338283))
            ThreePointArc((147.674440275, 25.352338283), (147.488616169, 25.215486162), (147.310827077, 25.068346296))
            Line((147.310827077, 25.068346296), (147.626392723, 24.532425869))
            Line((147.626392723, 24.532425869), (147.427280887, 24.329873098))
            Line((147.427280887, 24.329873098), (146.886032808, 24.636210979))
            ThreePointArc((146.886032808, 24.636210979), (146.74196044, 24.455927163), (146.608311964, 24.267785763))
            Line((146.608311964, 24.267785763), (147.051831385, 23.831800781))
            Line((147.051831385, 23.831800781), (146.911928635, 23.584615894))
            Line((146.911928635, 23.584615894), (146.309837059, 23.740430253))
            ThreePointArc((146.309837059, 23.740430253), (146.217334723, 23.529000786), (146.136934786, 23.312679378))
            Line((146.136934786, 23.312679378), (146.678182865, 23.006341497))
            Line((146.678182865, 23.006341497), (146.607023342, 22.731369734))
            Line((146.607023342, 22.731369734), (145.985119816, 22.726042082))
            ThreePointArc((145.985119816, 22.726042082), (145.950491394, 22.497875533), (145.928819118, 22.268116063))
            Line((145.928819118, 22.268116063), (146.530910694, 22.112301703))
            Line((146.530910694, 22.112301703), (146.533343802, 21.828281937))
            Line((146.533343802, 21.828281937), (145.934010022, 21.662175342))
            ThreePointArc((145.934010022, 21.662175342), (145.959615383, 21.432820885), (145.998147699, 21.205281081))
            Line((145.998147699, 21.205281081), (146.620051226, 21.210608734))
            Line((146.620051226, 21.210608734), (146.695911153, 20.936896441))
            Line((146.695911153, 20.936896441), (146.159990726, 20.621330795))
            ThreePointArc((146.159990726, 20.621330795), (146.244084908, 20.406418556), (146.340195901, 20.19660488))
            Line((146.340195901, 20.19660488), (146.939529681, 20.362711475))
            Line((146.939529681, 20.362711475), (147.083646698, 20.117959696))
            Line((147.083646698, 20.117959696), (146.647661717, 19.674440275))
            ThreePointArc((146.647661717, 19.674440275), (146.784513838, 19.488616169), (146.931653704, 19.310827077))
            Line((146.931653704, 19.310827077), (147.467574131, 19.626392723))
            Line((147.467574131, 19.626392723), (147.670126902, 19.427280887))
            Line((147.670126902, 19.427280887), (147.363789021, 18.886032808))
            ThreePointArc((147.363789021, 18.886032808), (147.544072837, 18.74196044), (147.732214237, 18.608311964))
            Line((147.732214237, 18.608311964), (148.168199219, 19.051831385))
            Line((148.168199219, 19.051831385), (148.415384106, 18.911928635))
            Line((148.415384106, 18.911928635), (148.259569747, 18.309837059))
            ThreePointArc((148.259569747, 18.309837059), (148.470999214, 18.217334723), (148.687320622, 18.136934786))
            Line((148.687320622, 18.136934786), (148.993658503, 18.678182865))
            Line((148.993658503, 18.678182865), (149.268630266, 18.607023342))
            Line((149.268630266, 18.607023342), (149.273957918, 17.985119816))
            ThreePointArc((149.273957918, 17.985119816), (149.502124467, 17.950491394), (149.731883937, 17.928819118))
            Line((149.731883937, 17.928819118), (149.887698297, 18.530910694))
            Line((149.887698297, 18.530910694), (150.171718063, 18.533343802))
            Line((150.171718063, 18.533343802), (150.337824658, 17.934010022))
            ThreePointArc((150.337824658, 17.934010022), (150.567179115, 17.959615383), (150.794718919, 17.998147699))
            Line((150.794718919, 17.998147699), (150.789391266, 18.620051226))
            Line((150.789391266, 18.620051226), (151.063103559, 18.695911153))
            Line((151.063103559, 18.695911153), (151.378669205, 18.159990726))
            ThreePointArc((151.378669205, 18.159990726), (151.593581444, 18.244084908), (151.80339512, 18.340195901))
            Line((151.80339512, 18.340195901), (151.637288525, 18.939529681))
            Line((151.637288525, 18.939529681), (151.882040304, 19.083646698))
            Line((151.882040304, 19.083646698), (152.325559725, 18.647661717))
        make_face()
        with Locations((150, 22)):
            Circle(CAVITY1_3_OUTLINE_R, mode=Mode.SUBTRACT)
    extrude(amount=CAVITY1_3_DEPTH, mode=Mode.SUBTRACT)

    # Cavity1 4 outline → Cavity1 4 (revolve, cut)
    with BuildSketch(Plane(origin=(150, 0, -22), x_dir=(1, 0, 0), z_dir=(0, 0, 1))):
        Polygon((2.805, 6), (2.805, 4.98), (5.61, 4.98), (4.59, 6), align=None)
    revolve(axis=Axis((150, 0, -22), (0, 1, 0)), mode=Mode.SUBTRACT)

    # Sketch7 → Cut-Extrude4 (cut)
    with BuildSketch(Plane.XZ):
        with Locations((133.375227796, -5.087928153)):
            Circle(SKETCH7_R)
        with Locations((136.950447624, -8.724932851)):
            Circle(SKETCH7_R)
        with Locations((140.525667453, -12.36193755)):
            Circle(SKETCH7_R)
        with Locations((144.100887282, -15.998942248)):
            Circle(SKETCH7_R)
        with Locations((156.001057752, -16.100887282)):
            Circle(SKETCH7_R)
        with Locations((159.63806245, -12.525667453)):
            Circle(SKETCH7_R)
        with Locations((163.275067149, -8.950447624)):
            Circle(SKETCH7_R)
        with Locations((143.998942248, -27.899112718)):
            Circle(SKETCH7_R)
        with Locations((140.36193755, -31.474332547)):
            Circle(SKETCH7_R)
        with Locations((136.724932851, -35.049552376)):
            Circle(SKETCH7_R)
        with Locations((133.087928153, -38.624772204)):
            Circle(SKETCH7_R)
        with Locations((155.899112718, -28.001057752)):
            Circle(SKETCH7_R)
        with Locations((159.474332547, -31.63806245)):
            Circle(SKETCH7_R)
        with Locations((163.049552376, -35.275067149)):
            Circle(SKETCH7_R)
        with Locations((150, -22)):
            Circle(SKETCH7_R_2)
    extrude(amount=-CUT_EXTRUDE4_DEPTH, mode=Mode.SUBTRACT)

    # Sketch8 → Cut-Extrude5 (cut)
    with BuildSketch(Plane.XZ.offset(-4.98)):
        with Locations(Location((150, -22, 0), (0, 0, 44.509177003))):
            Circle(SKETCH8_R)
    extrude(amount=-CUT_EXTRUDE5_DEPTH, mode=Mode.SUBTRACT)

    # Sketch9 → Boss-Extrude3 (add)
    with BuildSketch(Plane.XZ.offset(-4.98).offset(BOSS_EXTRUDE3_START)):
        with BuildLine():
            Line((161.767934886, -5.731544342), (163.360195023, -4.52129327))
            ThreePointArc((163.360195023, -4.52129327), (165.689039875, -6.577483091), (167.705029876, -8.941213032))
            Line((167.705029876, -8.941213032), (166.467677642, -10.512505318))
            Line((166.467677642, -10.512505318), (161.767934886, -5.731544342))
        make_face()
        with BuildLine():
            Line((167.47870673, -35.360195023), (166.268455658, -33.767934886))
            Line((166.268455658, -33.767934886), (161.487494682, -38.467677642))
            Line((161.487494682, -38.467677642), (163.058786968, -39.705029876))
            ThreePointArc((163.058786968, -39.705029876), (165.422516909, -37.689039875), (167.47870673, -35.360195023))
        make_face()
    extrude(amount=-BOSS_EXTRUDE3_DEPTH)


solid = part.part
